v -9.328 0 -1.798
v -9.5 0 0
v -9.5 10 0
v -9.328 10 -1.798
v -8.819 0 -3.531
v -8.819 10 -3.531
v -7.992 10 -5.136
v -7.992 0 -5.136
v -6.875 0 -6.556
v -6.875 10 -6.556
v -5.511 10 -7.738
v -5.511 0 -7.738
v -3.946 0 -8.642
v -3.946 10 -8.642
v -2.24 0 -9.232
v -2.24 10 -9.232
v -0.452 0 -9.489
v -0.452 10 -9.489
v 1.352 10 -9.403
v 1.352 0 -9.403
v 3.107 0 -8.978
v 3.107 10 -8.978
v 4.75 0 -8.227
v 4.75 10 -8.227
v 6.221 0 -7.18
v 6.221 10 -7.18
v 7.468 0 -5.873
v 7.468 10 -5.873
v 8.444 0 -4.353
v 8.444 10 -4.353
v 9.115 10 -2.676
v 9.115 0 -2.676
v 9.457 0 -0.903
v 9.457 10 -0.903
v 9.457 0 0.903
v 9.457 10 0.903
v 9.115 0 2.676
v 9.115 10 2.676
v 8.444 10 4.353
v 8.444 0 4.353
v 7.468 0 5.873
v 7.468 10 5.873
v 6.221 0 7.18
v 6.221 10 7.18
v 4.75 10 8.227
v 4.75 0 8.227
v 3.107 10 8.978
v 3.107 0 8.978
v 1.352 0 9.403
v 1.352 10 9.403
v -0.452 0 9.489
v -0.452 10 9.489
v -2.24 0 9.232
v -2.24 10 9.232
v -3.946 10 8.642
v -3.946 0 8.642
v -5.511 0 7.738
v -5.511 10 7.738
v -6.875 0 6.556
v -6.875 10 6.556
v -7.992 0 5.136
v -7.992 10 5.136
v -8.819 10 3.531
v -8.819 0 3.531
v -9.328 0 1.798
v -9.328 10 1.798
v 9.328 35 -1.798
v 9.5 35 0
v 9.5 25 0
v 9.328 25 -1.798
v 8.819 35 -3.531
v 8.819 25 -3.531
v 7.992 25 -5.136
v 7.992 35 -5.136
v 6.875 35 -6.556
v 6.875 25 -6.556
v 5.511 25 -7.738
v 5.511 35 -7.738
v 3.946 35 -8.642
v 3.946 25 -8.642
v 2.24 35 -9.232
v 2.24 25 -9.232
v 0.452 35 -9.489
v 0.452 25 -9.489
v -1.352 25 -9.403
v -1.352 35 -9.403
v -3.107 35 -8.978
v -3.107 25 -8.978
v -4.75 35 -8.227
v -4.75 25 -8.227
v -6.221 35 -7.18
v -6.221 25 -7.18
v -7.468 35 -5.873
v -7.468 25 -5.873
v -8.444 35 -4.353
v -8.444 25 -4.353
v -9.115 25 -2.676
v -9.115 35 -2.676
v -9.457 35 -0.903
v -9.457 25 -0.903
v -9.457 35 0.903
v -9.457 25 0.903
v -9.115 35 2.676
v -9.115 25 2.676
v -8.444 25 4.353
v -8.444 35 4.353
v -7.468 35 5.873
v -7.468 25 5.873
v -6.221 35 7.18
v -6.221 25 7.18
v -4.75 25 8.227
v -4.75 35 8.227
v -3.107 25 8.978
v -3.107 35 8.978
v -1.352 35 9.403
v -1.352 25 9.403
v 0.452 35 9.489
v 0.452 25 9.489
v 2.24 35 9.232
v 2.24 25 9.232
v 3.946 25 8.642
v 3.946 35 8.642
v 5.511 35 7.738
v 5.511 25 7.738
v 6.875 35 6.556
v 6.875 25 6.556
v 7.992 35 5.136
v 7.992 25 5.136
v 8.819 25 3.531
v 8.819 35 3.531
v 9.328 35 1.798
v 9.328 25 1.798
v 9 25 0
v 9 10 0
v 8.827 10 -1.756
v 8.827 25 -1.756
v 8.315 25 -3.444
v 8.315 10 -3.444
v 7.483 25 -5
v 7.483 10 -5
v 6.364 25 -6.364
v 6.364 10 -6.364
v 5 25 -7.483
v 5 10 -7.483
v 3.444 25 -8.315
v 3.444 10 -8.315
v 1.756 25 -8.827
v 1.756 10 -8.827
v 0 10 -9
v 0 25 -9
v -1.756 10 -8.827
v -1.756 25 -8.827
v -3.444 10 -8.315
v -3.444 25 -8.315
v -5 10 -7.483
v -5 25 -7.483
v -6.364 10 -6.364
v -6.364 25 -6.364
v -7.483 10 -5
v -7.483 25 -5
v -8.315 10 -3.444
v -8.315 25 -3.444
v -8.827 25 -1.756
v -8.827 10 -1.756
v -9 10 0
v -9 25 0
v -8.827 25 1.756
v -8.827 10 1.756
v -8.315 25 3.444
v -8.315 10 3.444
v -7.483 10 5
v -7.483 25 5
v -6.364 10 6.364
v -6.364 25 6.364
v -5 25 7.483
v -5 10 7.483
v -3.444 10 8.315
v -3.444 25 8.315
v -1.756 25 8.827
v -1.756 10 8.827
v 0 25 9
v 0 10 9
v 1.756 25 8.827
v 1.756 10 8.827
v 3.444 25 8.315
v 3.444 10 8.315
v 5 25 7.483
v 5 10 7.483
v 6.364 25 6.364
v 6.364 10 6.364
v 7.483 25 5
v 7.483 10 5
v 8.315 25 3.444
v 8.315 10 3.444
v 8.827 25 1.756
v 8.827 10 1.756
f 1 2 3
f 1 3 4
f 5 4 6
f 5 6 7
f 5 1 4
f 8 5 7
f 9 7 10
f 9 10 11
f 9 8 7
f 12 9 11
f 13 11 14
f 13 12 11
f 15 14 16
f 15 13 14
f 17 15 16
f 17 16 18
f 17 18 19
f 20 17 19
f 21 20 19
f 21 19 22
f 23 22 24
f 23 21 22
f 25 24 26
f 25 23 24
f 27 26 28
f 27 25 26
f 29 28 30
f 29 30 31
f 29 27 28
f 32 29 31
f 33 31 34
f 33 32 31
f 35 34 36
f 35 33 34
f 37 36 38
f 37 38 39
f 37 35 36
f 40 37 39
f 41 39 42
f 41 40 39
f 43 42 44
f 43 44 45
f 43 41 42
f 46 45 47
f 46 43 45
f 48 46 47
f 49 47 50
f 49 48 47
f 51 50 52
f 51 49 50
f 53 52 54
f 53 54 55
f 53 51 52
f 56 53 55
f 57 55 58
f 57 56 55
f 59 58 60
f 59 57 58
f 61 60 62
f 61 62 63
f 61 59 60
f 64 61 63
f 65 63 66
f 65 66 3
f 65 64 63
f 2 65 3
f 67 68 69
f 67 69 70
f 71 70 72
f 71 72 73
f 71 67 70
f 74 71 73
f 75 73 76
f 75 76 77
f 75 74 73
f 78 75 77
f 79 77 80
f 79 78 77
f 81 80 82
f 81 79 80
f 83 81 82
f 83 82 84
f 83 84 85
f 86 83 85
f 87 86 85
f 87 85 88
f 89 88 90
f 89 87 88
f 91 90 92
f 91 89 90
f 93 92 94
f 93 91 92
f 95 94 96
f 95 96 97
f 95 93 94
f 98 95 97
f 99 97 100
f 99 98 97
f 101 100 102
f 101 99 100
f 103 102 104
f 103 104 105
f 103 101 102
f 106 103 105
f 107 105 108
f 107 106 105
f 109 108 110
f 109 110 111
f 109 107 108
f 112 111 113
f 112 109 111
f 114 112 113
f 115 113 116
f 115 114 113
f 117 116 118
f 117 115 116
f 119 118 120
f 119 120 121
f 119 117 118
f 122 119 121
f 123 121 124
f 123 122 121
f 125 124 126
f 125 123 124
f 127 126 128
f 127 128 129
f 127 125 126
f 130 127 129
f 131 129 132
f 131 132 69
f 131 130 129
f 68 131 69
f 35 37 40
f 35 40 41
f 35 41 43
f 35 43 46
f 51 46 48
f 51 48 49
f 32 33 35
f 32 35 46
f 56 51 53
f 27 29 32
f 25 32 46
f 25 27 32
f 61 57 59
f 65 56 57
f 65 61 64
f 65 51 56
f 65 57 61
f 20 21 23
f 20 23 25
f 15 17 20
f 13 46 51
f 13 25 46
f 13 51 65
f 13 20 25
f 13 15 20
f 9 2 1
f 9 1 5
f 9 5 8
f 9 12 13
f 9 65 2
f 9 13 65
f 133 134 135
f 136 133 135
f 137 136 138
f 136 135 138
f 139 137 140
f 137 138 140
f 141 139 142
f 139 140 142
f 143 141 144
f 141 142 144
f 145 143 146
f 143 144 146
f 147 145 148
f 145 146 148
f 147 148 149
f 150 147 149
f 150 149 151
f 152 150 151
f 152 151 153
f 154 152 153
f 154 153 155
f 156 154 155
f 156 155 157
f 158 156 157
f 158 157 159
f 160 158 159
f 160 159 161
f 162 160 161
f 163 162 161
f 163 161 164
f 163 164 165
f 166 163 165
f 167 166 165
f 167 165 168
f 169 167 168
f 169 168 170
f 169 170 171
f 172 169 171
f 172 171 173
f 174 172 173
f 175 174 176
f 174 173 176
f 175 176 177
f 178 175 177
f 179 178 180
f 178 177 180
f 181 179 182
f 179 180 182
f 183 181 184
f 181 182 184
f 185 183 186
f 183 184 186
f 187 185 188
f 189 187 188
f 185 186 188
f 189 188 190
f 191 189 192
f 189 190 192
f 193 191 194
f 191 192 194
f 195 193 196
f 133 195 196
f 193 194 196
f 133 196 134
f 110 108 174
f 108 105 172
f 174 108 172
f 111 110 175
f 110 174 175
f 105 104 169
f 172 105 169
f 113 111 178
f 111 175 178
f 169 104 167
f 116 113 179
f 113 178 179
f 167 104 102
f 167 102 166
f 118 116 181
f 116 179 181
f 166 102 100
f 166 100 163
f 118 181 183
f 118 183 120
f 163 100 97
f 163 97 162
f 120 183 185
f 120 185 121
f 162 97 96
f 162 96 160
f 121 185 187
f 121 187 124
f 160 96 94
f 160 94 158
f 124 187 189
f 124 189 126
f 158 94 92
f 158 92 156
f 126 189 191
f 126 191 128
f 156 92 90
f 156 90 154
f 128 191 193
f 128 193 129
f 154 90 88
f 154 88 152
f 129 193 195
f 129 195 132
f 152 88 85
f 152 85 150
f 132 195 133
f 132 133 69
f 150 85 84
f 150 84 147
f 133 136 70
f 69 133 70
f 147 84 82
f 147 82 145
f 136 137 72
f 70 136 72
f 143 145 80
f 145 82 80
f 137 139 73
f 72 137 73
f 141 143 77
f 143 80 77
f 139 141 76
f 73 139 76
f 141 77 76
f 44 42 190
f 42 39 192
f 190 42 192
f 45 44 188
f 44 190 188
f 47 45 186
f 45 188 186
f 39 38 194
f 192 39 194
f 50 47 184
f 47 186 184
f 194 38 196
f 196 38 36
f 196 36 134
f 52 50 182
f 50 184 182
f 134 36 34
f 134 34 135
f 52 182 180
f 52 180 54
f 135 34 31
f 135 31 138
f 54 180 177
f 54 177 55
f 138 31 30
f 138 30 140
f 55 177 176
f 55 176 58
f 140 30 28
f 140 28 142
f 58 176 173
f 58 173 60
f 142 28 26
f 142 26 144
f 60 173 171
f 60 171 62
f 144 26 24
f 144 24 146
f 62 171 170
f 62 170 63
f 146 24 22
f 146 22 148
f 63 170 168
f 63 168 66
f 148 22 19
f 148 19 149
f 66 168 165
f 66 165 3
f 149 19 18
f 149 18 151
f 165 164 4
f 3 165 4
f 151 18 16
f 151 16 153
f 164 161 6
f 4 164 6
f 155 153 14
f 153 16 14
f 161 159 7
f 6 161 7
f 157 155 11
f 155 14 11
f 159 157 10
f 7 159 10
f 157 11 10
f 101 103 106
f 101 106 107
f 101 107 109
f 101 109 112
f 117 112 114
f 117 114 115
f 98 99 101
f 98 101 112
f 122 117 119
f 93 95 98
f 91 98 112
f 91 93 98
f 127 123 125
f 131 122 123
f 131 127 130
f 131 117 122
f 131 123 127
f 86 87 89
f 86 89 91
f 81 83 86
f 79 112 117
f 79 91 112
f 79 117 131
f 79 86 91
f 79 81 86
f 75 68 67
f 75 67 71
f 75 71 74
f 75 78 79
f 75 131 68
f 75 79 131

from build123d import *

# Parameters (mm, degrees)
SKETCH1_R           = 9
BOSS_EXTRUDE1_DEPTH = 35
SKETCH2_R           = 9.5
SKETCH2_R_2         = 9
BOSS_EXTRUDE2_DEPTH = 10
SKETCH3_R           = 9.5
SKETCH3_R_2         = 9
BOSS_EXTRUDE3_DEPTH = 10


with BuildPart() as part:
    # Sketch1 → Boss-Extrude1 (new body)
    with BuildSketch(Plane(origin=(0, 0, 0), x_dir=(1, 0, 0), z_dir=(0, 1, 0))):
        Circle(SKETCH1_R)
    extrude(amount=BOSS_EXTRUDE1_DEPTH)

    # Sketch2 → Boss-Extrude2 (add)
    with BuildSketch(Plane(origin=(0, 35, 0), x_dir=(1, 0, 0), z_dir=(0, 1, 0))):
        Circle(SKETCH2_R)
        Circle(SKETCH2_R_2, mode=Mode.SUBTRACT)
    extrude(amount=-BOSS_EXTRUDE2_DEPTH)

    # Sketch3 → Boss-Extrude3 (add)
    with BuildSketch(Plane(origin=(0, 0, 0), x_dir=(-1, 0, 0), z_dir=(0, -1, 0))):
        Circle(SKETCH3_R)
        Circle(SKETCH3_R_2, mode=Mode.SUBTRACT)
    extrude(amount=-BOSS_EXTRUDE3_DEPTH)


solid = part.part
